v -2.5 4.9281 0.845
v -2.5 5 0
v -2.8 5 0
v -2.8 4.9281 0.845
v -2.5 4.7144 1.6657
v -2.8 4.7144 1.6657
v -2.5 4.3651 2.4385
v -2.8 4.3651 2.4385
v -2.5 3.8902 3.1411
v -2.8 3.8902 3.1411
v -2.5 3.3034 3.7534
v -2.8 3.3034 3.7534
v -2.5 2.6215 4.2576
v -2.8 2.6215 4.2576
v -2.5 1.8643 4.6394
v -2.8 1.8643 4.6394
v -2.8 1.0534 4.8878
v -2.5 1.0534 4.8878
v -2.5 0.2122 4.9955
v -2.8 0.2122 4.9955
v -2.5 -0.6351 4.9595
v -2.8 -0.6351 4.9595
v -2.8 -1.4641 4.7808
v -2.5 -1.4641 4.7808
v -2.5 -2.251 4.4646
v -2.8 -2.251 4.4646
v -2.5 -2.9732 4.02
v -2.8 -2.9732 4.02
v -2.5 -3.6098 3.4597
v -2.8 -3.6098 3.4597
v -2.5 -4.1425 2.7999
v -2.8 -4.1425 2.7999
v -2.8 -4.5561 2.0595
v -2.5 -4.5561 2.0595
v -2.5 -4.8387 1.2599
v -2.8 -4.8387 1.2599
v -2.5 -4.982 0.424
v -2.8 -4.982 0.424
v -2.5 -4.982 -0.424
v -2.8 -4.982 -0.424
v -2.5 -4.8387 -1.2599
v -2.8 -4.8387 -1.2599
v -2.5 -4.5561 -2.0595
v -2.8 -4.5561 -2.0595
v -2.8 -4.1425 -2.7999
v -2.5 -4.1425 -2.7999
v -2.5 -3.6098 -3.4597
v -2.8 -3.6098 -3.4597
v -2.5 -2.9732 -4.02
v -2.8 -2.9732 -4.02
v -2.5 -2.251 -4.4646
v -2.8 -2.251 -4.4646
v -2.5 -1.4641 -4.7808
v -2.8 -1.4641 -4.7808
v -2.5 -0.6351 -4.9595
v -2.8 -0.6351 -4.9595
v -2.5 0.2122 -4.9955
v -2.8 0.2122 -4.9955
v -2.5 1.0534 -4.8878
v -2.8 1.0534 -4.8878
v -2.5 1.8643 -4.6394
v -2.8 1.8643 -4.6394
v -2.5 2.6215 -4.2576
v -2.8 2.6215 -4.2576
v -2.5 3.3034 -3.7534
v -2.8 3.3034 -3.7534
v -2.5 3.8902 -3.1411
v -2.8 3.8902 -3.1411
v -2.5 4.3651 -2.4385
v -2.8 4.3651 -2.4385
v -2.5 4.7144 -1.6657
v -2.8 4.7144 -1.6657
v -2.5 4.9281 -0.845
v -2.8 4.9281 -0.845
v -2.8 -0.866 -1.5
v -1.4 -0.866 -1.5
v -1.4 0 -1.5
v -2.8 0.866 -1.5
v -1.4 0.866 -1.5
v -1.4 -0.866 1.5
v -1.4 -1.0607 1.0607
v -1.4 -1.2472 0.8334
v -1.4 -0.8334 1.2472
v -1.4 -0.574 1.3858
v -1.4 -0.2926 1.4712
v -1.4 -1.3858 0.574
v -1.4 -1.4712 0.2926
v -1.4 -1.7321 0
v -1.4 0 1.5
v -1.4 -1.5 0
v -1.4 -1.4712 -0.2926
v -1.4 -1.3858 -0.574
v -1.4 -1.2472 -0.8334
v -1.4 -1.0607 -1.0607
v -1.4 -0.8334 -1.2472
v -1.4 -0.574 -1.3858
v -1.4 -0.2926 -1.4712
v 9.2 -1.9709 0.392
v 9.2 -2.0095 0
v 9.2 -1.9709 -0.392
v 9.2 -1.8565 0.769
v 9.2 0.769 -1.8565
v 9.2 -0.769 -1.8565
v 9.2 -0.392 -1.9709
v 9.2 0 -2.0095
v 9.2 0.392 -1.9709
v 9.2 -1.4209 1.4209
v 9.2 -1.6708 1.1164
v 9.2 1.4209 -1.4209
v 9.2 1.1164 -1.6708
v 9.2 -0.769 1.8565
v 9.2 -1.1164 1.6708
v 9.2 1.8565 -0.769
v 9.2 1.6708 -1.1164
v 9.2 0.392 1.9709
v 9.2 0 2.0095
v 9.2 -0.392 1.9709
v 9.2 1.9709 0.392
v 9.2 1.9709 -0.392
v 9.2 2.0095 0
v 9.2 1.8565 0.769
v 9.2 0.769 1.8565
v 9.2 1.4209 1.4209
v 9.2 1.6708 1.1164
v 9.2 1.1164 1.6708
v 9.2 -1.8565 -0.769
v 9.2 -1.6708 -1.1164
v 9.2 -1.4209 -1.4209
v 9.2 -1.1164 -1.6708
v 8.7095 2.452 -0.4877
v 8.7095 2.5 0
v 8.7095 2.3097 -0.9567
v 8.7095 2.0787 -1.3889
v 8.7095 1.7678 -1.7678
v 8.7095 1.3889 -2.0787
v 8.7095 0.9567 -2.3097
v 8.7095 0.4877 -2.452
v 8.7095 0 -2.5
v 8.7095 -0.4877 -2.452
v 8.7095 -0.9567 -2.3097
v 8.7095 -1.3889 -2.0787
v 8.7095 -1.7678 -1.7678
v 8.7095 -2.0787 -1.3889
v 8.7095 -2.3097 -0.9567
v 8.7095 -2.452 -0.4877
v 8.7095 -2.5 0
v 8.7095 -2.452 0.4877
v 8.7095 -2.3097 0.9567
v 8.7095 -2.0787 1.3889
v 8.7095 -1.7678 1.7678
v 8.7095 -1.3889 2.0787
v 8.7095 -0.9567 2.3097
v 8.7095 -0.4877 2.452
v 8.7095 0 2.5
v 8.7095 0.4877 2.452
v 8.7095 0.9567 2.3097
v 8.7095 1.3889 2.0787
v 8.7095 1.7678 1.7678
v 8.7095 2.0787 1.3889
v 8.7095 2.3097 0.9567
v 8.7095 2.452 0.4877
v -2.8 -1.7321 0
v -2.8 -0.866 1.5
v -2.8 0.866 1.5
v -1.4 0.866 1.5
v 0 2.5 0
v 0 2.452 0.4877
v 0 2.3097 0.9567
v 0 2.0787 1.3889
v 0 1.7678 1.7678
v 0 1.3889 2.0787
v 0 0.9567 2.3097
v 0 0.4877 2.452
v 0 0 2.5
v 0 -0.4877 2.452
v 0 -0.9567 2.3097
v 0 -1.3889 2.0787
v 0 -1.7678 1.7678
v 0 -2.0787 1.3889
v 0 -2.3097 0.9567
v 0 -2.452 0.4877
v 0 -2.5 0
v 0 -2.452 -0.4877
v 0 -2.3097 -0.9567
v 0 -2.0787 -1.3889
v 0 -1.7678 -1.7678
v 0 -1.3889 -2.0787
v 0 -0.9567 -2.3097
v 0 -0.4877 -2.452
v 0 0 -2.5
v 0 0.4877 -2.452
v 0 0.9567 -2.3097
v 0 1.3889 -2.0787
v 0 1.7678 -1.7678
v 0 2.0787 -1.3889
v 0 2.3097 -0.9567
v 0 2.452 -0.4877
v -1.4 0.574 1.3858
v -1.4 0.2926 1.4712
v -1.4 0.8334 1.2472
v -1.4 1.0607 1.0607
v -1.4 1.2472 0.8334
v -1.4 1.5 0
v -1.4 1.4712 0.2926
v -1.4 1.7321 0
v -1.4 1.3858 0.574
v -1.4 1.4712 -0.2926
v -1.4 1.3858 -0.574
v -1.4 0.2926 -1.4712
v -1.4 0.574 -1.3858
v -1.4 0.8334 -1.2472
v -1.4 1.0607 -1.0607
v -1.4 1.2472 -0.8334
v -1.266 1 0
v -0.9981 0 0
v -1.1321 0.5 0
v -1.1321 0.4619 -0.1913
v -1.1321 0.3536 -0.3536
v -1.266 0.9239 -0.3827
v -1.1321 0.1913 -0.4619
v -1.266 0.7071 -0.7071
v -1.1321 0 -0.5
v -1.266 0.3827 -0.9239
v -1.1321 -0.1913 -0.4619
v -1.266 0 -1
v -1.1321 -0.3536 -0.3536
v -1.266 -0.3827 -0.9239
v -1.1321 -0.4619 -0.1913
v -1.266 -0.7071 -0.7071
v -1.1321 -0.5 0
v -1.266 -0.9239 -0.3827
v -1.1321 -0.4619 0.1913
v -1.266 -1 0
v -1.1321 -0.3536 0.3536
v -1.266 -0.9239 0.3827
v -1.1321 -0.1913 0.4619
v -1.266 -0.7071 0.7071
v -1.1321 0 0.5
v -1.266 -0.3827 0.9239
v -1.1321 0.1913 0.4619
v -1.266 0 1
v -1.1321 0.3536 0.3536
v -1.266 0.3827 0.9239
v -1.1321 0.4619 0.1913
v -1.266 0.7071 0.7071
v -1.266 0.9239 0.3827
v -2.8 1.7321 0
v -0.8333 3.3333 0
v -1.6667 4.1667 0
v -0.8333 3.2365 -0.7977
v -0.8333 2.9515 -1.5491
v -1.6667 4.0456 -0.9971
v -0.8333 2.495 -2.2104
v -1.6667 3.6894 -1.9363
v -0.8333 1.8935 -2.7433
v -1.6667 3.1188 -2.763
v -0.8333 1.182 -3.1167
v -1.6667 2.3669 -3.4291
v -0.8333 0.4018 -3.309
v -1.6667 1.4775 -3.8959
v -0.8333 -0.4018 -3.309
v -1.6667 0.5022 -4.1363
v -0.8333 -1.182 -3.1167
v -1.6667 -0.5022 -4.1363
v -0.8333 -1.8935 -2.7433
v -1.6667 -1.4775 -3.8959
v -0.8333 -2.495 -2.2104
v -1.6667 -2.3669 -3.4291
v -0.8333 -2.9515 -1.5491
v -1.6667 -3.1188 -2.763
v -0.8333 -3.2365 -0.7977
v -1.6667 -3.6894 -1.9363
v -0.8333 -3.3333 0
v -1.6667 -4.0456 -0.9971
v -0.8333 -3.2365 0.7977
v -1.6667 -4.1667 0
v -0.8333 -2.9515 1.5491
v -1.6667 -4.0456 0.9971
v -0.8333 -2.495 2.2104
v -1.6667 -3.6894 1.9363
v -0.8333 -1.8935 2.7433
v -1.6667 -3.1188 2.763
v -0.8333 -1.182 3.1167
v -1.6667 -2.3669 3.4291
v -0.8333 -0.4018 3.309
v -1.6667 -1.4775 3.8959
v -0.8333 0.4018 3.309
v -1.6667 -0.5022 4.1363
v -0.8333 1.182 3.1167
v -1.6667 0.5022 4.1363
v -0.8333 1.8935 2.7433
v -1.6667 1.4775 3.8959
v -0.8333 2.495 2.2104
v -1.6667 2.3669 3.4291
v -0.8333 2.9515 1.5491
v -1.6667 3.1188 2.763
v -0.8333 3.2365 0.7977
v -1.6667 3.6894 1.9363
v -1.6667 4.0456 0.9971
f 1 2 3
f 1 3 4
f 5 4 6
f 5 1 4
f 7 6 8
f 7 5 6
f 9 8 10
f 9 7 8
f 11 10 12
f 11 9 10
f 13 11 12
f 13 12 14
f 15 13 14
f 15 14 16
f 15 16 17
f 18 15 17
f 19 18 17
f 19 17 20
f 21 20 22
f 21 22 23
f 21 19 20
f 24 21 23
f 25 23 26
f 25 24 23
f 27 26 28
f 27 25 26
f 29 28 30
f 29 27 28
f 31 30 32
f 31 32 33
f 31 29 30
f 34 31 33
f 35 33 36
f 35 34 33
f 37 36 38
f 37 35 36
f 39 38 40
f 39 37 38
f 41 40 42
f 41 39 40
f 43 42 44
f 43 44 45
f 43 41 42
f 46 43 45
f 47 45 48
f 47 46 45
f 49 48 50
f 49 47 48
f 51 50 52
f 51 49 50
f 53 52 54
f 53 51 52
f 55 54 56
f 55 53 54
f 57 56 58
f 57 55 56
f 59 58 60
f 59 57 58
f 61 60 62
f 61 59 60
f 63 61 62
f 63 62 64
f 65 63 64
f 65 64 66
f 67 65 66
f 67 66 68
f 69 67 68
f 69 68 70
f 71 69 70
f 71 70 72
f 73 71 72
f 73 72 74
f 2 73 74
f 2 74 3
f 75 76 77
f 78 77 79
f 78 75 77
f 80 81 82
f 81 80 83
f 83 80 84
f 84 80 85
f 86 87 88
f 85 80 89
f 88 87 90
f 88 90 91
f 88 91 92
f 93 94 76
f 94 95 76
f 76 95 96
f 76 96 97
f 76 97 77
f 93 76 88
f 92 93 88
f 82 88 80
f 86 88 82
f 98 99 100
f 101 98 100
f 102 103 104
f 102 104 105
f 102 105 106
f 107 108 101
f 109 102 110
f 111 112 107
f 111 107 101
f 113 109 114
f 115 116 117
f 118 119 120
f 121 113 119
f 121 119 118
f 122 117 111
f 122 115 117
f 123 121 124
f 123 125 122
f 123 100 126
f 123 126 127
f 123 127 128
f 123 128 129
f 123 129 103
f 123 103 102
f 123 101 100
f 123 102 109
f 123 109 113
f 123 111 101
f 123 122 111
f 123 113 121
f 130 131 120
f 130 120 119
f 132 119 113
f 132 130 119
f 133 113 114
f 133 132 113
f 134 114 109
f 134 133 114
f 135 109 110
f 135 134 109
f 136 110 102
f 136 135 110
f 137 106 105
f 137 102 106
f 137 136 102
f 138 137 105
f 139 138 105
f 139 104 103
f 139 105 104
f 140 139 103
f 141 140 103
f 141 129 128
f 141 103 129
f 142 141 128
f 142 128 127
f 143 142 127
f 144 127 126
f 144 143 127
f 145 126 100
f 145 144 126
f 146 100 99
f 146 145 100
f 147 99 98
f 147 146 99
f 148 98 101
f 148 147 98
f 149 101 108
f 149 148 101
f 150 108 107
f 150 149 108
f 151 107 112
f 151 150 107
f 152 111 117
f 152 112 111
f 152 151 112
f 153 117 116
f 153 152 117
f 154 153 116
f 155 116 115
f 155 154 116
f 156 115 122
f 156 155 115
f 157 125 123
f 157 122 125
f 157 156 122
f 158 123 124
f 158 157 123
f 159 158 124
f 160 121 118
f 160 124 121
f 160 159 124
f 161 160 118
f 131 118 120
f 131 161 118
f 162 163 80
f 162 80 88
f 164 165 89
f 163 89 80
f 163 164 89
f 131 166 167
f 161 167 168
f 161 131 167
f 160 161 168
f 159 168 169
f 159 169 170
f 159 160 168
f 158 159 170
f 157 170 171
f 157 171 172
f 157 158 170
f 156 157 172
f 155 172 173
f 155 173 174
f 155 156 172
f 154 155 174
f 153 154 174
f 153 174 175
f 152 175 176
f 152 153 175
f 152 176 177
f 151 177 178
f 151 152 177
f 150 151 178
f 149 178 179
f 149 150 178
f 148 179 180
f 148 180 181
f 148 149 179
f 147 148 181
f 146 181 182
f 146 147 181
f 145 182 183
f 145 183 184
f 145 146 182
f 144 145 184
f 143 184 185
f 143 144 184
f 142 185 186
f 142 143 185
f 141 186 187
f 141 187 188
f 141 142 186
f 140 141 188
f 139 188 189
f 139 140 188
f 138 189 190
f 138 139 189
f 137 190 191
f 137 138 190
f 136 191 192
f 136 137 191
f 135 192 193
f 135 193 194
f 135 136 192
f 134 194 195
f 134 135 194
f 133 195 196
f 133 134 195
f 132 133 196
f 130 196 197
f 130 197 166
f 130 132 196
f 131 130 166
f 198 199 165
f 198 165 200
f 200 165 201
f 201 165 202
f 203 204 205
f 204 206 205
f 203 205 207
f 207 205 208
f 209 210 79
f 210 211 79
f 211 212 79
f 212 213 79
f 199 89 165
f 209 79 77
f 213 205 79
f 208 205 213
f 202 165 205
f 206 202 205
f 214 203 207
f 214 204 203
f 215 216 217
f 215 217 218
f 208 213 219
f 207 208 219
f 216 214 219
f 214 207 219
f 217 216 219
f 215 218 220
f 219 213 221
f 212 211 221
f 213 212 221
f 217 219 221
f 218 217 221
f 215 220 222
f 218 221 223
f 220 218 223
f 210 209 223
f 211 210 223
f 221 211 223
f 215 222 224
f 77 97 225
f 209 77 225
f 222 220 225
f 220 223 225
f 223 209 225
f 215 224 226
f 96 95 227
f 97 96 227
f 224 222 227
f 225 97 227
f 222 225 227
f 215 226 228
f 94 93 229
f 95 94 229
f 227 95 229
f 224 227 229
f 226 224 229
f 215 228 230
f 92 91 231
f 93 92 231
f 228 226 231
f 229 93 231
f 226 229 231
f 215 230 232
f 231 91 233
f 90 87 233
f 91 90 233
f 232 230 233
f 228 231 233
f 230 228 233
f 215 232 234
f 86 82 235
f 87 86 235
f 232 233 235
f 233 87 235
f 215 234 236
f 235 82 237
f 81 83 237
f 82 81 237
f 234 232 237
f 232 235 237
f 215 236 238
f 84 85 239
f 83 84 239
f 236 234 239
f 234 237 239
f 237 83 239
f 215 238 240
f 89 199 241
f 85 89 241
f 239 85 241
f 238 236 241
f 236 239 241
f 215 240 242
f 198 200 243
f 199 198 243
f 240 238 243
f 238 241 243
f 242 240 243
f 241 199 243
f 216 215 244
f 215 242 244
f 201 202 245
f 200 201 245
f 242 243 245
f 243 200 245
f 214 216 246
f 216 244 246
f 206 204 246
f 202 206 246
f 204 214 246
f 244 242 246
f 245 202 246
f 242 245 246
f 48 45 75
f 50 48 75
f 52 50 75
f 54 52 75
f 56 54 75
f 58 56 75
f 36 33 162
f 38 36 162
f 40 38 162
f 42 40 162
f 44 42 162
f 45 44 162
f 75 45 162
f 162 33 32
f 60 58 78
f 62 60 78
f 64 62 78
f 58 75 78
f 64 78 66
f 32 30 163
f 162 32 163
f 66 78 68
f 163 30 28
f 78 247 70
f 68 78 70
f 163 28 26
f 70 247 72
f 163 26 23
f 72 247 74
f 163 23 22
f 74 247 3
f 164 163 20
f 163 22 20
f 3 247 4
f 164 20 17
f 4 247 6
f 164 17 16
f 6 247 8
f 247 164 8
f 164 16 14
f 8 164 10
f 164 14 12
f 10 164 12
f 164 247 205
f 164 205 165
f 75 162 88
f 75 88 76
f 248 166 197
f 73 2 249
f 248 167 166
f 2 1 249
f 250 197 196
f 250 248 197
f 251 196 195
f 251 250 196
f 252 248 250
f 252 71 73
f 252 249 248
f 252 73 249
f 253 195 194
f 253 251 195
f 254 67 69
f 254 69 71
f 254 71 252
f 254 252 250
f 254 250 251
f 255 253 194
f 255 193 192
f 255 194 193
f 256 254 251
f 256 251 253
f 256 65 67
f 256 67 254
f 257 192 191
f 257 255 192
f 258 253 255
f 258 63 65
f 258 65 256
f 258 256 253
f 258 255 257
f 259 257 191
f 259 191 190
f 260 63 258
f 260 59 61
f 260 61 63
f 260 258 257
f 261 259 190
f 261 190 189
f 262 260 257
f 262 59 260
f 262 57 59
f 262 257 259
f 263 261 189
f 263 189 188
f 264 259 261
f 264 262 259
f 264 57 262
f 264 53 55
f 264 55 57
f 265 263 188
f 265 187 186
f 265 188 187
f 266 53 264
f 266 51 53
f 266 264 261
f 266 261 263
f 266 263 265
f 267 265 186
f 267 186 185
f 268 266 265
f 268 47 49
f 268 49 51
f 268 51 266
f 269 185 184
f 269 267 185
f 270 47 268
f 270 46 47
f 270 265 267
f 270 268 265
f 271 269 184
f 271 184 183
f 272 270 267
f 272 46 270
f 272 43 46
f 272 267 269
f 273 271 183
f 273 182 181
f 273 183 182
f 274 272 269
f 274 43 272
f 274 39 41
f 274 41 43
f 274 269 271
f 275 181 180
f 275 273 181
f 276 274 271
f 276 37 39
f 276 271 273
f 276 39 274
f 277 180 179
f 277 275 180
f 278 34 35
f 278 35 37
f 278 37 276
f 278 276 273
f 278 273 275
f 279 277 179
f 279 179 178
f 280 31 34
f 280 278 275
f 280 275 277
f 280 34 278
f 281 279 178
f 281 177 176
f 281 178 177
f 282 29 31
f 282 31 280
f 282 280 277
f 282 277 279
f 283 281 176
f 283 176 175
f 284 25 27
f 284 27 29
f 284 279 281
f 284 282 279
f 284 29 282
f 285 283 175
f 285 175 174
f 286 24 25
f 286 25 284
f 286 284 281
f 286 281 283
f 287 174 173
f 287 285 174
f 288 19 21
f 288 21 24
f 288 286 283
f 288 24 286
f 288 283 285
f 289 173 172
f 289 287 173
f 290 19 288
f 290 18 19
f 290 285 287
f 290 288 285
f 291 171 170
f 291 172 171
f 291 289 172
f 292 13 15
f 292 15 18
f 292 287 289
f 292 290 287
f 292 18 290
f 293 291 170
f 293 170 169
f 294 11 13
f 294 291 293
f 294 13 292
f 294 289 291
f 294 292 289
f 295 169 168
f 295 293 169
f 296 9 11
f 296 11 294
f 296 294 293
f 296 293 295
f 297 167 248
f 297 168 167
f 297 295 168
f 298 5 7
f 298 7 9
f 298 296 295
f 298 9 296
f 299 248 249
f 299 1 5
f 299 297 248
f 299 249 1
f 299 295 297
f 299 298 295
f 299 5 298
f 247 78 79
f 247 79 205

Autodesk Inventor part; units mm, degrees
sketch "Sketch_1" plane through (0, 0, 0) normal (0, 0, 1) x (1, 0, 0)
  line L0 (9.2, 0) -> (0, 0)
  line L1 (-2.8, 0) -> (-2.8, 5)
  line L2 (-2.8, 5) -> (-2.5, 5)
  line L3 (-2.5, 5) -> (0, 2.5)
  line L4 (0, 2.5) -> (8.7095, 2.5)
  line L5 (8.7095, 2.5) -> (9.2, 2.0095)
  line L6 (9.2, 2.0095) -> (9.2, 0)
  line L7 (9.2, 0) -> (-2.8, 0)
revolve "Revolution1" add sketch "Sketch_1" angle 360 about axis through (9.2, 0, 0) along (1, 0, 0)
thread "Thread1" size "M5x0.8" class "6g" standard "ISO Metric profile" length 8.3 offset 0.9
sketch "Sketch_4" plane through (0, 0, 0) normal (0, 0, 1) x (1, 0, 0)
  line L0 (-0.9981, 0) -> (-2.8, 0)
  line L1 (-2.8, 0) -> (-2.8, 1.5)
  line L2 (-2.8, 1.5) -> (-1.4, 1.5)
  line L3 (-1.4, 1.5) -> (-0.9981, 0)
  line L4 (-0.9981, 0) -> (-2.8, 0)
revolve "Revolution2" cut sketch "Sketch_4" angle 360 about axis through (-0.9981, 0, 0) along (1, 0, 0)
sketch "Sketch_3" plane through (-2.8, 0, 0) normal (1, 0, 0) x (0, 0, -1)
  line L0 (-1.5, 0.866) -> (-1.5, -0.866)
  line L1 (-1.5, -0.866) -> (0, -1.7321)
  line L2 (0, -1.7321) -> (1.5, -0.866)
  line L3 (1.5, -0.866) -> (1.5, 0.866)
  line L4 (1.5, 0.866) -> (0, 1.7321)
  line L5 (0, 1.7321) -> (-1.5, 0.866)
extrude "Extrusion1" cut sketch "Sketch_3" along normal blind 1.4
ref_plane "dummy_to_bolt_XY" through (0, 0, 0) normal (1, 0, 0) x (0, 0, -1)
ref_plane "dummy_to_bolt_YZ" through (0, 0, 0) normal (0, 0, -1) x (0, 1, 0)
ref_plane "dummy_to_bolt_ZX" through (0, 0, 0) normal (0, 1, 0) x (1, 0, 0)
ref_plane "bolt_to_nut_XY" through (9.2, 0, 0) normal (1, 0, 0) x (0, 0, -1)
ref_plane "bolt_to_nut_YZ" through (9.2, 0, 0) normal (0, 0, -1) x (0, 1, 0)
ref_plane "bolt_to_nut_ZX" through (9.2, 0, 0) normal (0, 1, 0) x (1, 0, 0)
properties part number "SHFBS5-12"
